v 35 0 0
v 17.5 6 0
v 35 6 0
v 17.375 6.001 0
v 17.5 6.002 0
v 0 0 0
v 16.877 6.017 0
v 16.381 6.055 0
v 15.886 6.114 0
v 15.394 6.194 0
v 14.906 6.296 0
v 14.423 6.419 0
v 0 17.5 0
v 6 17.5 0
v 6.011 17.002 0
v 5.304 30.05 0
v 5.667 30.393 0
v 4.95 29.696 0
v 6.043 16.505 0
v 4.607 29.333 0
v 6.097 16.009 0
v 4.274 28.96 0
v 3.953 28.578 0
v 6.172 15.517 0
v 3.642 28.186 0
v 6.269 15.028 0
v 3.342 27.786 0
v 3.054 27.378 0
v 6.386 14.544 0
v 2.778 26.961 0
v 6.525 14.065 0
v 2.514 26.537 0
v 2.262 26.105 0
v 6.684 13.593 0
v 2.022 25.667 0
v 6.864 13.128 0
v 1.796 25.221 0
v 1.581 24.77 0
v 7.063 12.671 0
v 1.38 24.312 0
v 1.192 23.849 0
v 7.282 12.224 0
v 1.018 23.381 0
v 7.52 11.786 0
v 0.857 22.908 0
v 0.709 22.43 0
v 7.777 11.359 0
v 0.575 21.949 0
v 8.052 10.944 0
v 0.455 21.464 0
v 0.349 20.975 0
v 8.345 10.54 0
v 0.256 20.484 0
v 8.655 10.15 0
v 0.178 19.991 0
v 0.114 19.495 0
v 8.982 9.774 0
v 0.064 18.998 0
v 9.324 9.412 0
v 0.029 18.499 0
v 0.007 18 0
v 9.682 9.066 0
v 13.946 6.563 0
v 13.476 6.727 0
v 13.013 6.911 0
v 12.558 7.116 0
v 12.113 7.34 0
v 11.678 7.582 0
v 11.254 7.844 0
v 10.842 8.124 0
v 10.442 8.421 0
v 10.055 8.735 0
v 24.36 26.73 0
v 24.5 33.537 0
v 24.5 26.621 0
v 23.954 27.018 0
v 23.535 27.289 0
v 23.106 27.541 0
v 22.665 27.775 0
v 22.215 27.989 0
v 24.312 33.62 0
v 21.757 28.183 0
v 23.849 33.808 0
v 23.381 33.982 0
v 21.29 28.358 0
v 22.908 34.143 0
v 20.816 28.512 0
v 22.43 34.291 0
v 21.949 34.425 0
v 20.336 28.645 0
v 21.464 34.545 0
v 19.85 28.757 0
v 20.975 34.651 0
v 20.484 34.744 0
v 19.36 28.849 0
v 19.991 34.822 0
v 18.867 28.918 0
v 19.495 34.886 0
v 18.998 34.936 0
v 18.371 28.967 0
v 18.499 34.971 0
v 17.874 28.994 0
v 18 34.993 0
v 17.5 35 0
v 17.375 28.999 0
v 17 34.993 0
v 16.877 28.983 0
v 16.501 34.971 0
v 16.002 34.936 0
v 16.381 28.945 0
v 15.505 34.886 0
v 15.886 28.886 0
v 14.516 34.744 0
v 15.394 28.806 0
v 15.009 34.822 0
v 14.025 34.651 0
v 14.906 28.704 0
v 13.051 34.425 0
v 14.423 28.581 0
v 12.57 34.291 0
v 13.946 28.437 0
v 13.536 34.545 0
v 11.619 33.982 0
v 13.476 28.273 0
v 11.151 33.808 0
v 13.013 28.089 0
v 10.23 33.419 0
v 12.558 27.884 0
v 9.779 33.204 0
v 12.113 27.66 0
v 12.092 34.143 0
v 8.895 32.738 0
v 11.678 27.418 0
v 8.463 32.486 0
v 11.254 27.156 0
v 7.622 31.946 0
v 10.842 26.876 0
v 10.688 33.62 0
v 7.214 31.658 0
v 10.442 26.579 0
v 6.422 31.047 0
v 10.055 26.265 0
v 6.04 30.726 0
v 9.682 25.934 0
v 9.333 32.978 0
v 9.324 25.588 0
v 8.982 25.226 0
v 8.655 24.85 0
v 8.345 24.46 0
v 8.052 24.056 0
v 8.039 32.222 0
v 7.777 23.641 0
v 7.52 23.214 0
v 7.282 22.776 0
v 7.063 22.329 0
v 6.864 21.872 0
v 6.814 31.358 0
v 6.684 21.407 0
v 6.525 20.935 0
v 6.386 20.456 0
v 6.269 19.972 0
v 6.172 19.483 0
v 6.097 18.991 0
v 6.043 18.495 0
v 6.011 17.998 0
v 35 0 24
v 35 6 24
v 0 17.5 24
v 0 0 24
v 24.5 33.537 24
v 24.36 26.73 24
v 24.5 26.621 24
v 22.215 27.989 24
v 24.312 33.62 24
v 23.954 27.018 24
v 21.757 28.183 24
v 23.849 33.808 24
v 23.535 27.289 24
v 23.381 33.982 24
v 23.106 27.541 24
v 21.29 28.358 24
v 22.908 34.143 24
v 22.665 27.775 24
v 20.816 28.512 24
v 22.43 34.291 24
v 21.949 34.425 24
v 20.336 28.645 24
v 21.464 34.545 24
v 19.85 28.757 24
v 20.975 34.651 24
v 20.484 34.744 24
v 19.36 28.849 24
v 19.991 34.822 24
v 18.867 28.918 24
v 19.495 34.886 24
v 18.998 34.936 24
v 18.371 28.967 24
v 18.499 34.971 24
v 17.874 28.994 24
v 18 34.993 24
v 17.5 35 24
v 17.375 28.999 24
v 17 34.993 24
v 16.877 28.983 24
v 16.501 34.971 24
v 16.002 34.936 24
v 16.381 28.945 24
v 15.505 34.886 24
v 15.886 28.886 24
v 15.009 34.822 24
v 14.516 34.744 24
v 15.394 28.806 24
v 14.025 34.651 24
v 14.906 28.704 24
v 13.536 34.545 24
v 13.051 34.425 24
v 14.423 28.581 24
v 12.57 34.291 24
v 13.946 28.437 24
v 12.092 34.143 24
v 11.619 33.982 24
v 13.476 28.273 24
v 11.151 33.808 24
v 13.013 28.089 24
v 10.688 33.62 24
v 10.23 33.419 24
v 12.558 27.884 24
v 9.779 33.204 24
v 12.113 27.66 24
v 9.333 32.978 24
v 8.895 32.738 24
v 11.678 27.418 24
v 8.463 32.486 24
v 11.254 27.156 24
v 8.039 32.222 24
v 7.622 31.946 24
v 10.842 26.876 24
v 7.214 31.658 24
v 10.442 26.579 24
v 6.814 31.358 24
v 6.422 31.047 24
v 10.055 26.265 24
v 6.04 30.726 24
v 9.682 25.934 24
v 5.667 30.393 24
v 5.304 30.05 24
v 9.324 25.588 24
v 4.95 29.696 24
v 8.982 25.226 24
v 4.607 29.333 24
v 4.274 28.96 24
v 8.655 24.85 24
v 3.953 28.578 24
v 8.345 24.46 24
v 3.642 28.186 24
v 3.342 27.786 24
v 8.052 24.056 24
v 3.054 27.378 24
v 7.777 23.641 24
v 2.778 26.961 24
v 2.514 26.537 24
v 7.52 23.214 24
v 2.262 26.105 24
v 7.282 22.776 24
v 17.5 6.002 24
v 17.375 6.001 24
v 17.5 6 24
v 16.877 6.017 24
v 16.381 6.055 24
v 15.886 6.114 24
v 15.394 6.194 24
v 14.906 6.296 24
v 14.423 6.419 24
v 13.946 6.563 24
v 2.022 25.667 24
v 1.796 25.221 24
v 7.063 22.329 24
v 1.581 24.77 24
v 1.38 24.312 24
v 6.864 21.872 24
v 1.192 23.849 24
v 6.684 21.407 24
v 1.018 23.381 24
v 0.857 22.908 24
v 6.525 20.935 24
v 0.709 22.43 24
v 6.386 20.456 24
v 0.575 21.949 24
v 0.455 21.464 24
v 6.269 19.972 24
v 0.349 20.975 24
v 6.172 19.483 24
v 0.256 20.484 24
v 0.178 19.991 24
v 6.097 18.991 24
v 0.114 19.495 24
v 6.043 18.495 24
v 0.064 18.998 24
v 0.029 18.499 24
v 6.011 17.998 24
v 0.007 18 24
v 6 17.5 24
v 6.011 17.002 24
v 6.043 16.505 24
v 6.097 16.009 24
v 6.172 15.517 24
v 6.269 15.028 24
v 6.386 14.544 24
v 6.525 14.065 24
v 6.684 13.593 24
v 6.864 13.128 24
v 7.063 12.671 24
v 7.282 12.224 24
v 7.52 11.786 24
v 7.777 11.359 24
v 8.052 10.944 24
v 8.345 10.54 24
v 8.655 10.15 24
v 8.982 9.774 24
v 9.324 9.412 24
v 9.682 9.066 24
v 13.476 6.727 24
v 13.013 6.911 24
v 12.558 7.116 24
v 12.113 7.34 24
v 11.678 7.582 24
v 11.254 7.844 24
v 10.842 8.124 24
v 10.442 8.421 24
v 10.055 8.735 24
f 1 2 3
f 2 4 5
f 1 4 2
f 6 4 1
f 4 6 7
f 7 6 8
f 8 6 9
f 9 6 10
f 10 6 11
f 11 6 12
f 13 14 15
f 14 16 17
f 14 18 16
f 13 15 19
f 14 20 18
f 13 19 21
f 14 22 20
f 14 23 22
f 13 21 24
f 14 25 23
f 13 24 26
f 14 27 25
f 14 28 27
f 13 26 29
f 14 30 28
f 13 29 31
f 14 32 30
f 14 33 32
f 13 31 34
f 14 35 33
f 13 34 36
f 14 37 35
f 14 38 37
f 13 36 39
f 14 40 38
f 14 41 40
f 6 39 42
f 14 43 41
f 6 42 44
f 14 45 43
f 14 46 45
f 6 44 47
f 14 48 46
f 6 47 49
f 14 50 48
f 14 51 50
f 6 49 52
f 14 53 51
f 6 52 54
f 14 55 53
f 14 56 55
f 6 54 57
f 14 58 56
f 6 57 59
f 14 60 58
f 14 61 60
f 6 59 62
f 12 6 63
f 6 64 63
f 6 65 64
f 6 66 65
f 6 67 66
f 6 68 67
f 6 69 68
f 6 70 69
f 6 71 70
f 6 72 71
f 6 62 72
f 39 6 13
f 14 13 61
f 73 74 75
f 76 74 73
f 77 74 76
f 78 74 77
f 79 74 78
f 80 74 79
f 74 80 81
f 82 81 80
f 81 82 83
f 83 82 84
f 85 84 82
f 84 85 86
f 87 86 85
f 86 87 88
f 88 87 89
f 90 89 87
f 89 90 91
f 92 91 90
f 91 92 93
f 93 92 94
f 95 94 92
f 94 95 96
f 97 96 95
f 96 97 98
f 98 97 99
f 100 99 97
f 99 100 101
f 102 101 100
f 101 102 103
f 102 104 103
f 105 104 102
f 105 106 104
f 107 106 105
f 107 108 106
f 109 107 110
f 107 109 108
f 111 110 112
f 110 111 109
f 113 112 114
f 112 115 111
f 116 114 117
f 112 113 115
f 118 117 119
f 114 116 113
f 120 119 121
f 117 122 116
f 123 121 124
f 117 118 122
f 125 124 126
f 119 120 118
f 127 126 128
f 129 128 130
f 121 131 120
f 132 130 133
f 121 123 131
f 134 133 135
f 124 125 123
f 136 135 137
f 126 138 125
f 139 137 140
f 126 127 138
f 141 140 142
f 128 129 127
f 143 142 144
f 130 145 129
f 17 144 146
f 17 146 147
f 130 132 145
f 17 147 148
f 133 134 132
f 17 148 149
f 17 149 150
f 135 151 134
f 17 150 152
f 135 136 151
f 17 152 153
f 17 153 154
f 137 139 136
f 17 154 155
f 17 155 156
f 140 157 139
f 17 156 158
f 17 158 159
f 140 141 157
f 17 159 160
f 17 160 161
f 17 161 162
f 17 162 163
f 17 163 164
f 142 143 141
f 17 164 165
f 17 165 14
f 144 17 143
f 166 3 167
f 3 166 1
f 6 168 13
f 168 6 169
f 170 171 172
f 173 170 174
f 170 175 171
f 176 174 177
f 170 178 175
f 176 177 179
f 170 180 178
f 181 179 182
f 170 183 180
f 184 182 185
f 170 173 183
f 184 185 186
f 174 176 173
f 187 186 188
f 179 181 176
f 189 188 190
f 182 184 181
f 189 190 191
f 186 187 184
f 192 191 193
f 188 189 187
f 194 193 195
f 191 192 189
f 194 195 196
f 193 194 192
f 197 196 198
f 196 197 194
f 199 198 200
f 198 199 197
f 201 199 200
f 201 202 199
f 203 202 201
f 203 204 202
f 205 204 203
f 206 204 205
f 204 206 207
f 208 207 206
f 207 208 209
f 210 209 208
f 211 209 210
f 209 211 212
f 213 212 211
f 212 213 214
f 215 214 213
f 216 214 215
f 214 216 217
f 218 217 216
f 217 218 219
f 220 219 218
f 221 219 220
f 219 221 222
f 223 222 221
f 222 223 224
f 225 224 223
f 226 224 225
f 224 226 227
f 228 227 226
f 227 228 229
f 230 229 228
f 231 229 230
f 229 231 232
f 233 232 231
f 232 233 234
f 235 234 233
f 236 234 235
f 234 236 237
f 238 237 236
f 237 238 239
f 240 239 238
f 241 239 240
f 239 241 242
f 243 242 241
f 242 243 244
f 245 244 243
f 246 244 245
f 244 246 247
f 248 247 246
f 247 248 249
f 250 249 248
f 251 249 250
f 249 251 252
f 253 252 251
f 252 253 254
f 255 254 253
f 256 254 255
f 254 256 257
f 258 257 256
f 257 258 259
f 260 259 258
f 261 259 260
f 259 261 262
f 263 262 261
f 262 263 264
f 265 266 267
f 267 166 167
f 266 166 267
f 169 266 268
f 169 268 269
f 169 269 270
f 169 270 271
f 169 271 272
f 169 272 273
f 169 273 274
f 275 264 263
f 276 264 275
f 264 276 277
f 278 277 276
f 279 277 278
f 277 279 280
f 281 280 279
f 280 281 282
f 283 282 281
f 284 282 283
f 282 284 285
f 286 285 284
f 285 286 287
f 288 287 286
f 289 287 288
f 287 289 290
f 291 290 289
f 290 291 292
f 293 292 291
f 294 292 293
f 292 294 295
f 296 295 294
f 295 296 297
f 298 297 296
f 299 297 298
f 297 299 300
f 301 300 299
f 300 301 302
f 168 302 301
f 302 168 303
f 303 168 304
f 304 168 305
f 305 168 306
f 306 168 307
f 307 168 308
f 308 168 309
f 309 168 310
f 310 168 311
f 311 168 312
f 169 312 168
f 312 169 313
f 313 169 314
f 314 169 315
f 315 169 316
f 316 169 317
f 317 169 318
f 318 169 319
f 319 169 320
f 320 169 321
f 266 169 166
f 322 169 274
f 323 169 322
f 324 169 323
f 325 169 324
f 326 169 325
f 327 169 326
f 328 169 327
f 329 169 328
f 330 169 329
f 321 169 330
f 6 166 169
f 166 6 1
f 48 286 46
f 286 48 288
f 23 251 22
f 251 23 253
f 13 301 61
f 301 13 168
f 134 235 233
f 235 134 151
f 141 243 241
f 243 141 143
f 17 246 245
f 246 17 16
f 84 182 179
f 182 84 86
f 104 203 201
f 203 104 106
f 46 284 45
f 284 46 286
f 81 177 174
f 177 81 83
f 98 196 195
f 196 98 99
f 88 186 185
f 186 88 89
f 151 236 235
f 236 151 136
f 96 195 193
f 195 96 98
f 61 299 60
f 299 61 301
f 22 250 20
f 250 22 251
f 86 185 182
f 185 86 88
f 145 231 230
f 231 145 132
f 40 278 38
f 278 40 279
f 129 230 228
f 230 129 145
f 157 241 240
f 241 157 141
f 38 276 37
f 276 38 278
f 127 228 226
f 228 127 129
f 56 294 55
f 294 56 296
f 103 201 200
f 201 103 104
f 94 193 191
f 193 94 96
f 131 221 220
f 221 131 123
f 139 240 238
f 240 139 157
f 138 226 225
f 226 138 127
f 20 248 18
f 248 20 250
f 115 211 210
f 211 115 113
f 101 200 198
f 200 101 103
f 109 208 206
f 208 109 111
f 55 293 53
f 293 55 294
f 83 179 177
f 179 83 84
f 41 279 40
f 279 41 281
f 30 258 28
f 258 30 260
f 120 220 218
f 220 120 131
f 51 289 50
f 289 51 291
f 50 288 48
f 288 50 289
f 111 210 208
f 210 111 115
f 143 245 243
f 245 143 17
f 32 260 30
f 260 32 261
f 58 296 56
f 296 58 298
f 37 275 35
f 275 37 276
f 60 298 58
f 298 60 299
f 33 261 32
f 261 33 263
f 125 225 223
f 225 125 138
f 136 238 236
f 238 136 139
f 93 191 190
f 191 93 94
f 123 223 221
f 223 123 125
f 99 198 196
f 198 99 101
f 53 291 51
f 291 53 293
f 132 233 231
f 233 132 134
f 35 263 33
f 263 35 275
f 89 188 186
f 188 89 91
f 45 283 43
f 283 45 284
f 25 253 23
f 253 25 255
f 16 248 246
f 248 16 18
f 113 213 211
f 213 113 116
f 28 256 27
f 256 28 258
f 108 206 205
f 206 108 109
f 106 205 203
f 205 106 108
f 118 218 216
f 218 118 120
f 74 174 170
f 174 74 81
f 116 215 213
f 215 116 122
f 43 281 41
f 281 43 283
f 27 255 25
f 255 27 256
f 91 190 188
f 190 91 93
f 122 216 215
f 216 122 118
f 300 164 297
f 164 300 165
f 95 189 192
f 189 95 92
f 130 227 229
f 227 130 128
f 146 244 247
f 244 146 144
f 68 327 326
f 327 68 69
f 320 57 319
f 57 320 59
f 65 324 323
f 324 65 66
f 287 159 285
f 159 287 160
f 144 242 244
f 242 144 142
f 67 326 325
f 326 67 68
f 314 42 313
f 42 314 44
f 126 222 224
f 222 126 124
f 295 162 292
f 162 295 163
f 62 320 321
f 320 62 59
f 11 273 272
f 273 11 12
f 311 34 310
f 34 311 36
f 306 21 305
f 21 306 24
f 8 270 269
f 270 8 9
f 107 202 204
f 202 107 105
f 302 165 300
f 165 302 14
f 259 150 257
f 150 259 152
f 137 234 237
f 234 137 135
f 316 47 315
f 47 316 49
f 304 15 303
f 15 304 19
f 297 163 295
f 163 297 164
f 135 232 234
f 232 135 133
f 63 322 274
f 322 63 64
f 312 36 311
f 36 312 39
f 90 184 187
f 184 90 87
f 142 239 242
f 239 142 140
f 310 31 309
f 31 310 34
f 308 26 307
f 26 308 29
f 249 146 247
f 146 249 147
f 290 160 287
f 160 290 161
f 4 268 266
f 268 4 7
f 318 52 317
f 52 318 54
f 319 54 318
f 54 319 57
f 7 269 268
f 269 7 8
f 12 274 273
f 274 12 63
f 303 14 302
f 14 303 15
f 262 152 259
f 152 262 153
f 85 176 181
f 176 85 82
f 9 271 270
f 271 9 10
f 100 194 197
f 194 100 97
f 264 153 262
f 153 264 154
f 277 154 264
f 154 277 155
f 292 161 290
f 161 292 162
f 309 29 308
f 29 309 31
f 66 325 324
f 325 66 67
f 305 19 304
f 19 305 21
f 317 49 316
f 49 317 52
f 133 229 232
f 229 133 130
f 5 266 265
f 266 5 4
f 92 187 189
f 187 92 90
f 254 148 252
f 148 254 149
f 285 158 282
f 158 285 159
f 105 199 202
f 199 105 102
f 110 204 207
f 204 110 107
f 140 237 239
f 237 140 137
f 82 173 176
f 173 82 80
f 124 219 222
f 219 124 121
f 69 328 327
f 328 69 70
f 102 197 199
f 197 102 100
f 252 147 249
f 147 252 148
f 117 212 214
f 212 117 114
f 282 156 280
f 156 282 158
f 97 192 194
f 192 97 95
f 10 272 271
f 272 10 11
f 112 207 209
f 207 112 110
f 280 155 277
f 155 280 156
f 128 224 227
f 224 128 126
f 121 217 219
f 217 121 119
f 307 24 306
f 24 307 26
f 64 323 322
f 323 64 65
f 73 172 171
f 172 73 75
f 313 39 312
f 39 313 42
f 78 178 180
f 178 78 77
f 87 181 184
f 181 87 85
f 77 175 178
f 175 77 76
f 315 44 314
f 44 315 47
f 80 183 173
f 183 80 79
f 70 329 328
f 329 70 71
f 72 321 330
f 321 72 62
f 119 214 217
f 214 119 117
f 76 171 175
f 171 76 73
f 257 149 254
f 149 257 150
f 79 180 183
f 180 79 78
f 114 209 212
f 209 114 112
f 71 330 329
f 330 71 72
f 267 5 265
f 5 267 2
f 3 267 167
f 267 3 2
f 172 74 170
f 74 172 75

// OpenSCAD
$fa=0.5; // default minimum facet angle is now 0.5
$fs=0.5; // default minimum facet size is now 0.5 mm

external_d = 35;
internal_d_lower = 21;
internal_d_upper = 23;
height = 24;
opening = 18;

support_d = 145;
support_angle = 45;
testing_length = 75;

for_printing = true;

pole_d = 26;

// hidden
support_inner_d = support_d - height * 2;

//main();
hose_support();

module hose_support() {
    rotate([0,90,0])
    translate([-height/2,0,0])
    difference() {
        union() {
            translate([0, external_d/4, external_d/2]) cube([height, external_d/2, external_d], center=true);
            translate([0,external_d/2,external_d/2]) rotate([0,90,0]) cylinder(h=height, d=external_d, center=true);
        }
        translate([0,external_d/2,external_d/2]) rotate([0,90,0]) cylinder(h=height+2, d=internal_d_upper, center=true);
        translate([-height/2-1,external_d/2-internal_d_upper/2,external_d/2]) cube([height+2, external_d/2, external_d], center=false);
        translate([0,external_d-internal_d_upper/2,external_d+7]) cube([height+2, external_d, external_d], center=true);
    }
}

module main() {
    if (for_printing) {
        support(for_printing);
        
        translate([-external_d/2, -support_d/8, external_d/2]) 
        arm(for_printing);

        translate([0, -external_d - 10, 0])
        pole(for_printing);
    } else {
        support(for_printing);
        
        translate([0, -external_d/2, -support_d/2 + height])
        rotate([90,0,0])
        rotate([0,-90,0])
        arm(for_printing);
        
        translate([0, -external_d/2-support_d * sin(support_angle) / 2, height - support_d / 2 * (1 - cos(support_angle))])
        rotate([180+support_angle, 0, 0])
        translate([0,external_d,0])
        pole(for_printing);
    }
}

module support(for_printing) {
    difference() {
        union() {
            cylinder(h=height, d=external_d);
            translate([0,-external_d/4,height/2]) cube([external_d, external_d/2, height], center=true);
        }
        translate([0, 0, -1]) cylinder(h=height+2, d1=internal_d_lower, d2=internal_d_upper);
        translate([0, external_d/4, height/2]) cube([opening, external_d/2, height+2], center=true);
    }
    if (!for_printing) {
        translate([0,0,-testing_length+height]) cylinder(h = testing_length, d = internal_d_lower);
    }
}

module arm(for_printing) {
    difference() {
        cylinder(h=external_d, d = support_d, center=true);
        cylinder(h=external_d+2, d = support_inner_d, center=true);
        translate([-support_d/2,0,0]) cube([support_d, support_d+2, external_d+2], center=true);
        rotate([0,0,90+support_angle]) translate([-support_d/2,0,0]) cube([support_d, support_d+2, external_d+2], center=true);
    }
}

module pole(for_printing) {
    difference() {
        union() {
            cylinder(h=height, d=external_d);
            translate([0,-external_d/2,height/2]) cube([external_d, external_d, height], center=true);
        }
        translate([0, 0, -1]) cylinder(h=height+2, d=pole_d);
    }
    if (!for_printing) {
        translate([0,0,-testing_length+height]) cylinder(h = testing_length, d = internal_d_lower);
    }
}
